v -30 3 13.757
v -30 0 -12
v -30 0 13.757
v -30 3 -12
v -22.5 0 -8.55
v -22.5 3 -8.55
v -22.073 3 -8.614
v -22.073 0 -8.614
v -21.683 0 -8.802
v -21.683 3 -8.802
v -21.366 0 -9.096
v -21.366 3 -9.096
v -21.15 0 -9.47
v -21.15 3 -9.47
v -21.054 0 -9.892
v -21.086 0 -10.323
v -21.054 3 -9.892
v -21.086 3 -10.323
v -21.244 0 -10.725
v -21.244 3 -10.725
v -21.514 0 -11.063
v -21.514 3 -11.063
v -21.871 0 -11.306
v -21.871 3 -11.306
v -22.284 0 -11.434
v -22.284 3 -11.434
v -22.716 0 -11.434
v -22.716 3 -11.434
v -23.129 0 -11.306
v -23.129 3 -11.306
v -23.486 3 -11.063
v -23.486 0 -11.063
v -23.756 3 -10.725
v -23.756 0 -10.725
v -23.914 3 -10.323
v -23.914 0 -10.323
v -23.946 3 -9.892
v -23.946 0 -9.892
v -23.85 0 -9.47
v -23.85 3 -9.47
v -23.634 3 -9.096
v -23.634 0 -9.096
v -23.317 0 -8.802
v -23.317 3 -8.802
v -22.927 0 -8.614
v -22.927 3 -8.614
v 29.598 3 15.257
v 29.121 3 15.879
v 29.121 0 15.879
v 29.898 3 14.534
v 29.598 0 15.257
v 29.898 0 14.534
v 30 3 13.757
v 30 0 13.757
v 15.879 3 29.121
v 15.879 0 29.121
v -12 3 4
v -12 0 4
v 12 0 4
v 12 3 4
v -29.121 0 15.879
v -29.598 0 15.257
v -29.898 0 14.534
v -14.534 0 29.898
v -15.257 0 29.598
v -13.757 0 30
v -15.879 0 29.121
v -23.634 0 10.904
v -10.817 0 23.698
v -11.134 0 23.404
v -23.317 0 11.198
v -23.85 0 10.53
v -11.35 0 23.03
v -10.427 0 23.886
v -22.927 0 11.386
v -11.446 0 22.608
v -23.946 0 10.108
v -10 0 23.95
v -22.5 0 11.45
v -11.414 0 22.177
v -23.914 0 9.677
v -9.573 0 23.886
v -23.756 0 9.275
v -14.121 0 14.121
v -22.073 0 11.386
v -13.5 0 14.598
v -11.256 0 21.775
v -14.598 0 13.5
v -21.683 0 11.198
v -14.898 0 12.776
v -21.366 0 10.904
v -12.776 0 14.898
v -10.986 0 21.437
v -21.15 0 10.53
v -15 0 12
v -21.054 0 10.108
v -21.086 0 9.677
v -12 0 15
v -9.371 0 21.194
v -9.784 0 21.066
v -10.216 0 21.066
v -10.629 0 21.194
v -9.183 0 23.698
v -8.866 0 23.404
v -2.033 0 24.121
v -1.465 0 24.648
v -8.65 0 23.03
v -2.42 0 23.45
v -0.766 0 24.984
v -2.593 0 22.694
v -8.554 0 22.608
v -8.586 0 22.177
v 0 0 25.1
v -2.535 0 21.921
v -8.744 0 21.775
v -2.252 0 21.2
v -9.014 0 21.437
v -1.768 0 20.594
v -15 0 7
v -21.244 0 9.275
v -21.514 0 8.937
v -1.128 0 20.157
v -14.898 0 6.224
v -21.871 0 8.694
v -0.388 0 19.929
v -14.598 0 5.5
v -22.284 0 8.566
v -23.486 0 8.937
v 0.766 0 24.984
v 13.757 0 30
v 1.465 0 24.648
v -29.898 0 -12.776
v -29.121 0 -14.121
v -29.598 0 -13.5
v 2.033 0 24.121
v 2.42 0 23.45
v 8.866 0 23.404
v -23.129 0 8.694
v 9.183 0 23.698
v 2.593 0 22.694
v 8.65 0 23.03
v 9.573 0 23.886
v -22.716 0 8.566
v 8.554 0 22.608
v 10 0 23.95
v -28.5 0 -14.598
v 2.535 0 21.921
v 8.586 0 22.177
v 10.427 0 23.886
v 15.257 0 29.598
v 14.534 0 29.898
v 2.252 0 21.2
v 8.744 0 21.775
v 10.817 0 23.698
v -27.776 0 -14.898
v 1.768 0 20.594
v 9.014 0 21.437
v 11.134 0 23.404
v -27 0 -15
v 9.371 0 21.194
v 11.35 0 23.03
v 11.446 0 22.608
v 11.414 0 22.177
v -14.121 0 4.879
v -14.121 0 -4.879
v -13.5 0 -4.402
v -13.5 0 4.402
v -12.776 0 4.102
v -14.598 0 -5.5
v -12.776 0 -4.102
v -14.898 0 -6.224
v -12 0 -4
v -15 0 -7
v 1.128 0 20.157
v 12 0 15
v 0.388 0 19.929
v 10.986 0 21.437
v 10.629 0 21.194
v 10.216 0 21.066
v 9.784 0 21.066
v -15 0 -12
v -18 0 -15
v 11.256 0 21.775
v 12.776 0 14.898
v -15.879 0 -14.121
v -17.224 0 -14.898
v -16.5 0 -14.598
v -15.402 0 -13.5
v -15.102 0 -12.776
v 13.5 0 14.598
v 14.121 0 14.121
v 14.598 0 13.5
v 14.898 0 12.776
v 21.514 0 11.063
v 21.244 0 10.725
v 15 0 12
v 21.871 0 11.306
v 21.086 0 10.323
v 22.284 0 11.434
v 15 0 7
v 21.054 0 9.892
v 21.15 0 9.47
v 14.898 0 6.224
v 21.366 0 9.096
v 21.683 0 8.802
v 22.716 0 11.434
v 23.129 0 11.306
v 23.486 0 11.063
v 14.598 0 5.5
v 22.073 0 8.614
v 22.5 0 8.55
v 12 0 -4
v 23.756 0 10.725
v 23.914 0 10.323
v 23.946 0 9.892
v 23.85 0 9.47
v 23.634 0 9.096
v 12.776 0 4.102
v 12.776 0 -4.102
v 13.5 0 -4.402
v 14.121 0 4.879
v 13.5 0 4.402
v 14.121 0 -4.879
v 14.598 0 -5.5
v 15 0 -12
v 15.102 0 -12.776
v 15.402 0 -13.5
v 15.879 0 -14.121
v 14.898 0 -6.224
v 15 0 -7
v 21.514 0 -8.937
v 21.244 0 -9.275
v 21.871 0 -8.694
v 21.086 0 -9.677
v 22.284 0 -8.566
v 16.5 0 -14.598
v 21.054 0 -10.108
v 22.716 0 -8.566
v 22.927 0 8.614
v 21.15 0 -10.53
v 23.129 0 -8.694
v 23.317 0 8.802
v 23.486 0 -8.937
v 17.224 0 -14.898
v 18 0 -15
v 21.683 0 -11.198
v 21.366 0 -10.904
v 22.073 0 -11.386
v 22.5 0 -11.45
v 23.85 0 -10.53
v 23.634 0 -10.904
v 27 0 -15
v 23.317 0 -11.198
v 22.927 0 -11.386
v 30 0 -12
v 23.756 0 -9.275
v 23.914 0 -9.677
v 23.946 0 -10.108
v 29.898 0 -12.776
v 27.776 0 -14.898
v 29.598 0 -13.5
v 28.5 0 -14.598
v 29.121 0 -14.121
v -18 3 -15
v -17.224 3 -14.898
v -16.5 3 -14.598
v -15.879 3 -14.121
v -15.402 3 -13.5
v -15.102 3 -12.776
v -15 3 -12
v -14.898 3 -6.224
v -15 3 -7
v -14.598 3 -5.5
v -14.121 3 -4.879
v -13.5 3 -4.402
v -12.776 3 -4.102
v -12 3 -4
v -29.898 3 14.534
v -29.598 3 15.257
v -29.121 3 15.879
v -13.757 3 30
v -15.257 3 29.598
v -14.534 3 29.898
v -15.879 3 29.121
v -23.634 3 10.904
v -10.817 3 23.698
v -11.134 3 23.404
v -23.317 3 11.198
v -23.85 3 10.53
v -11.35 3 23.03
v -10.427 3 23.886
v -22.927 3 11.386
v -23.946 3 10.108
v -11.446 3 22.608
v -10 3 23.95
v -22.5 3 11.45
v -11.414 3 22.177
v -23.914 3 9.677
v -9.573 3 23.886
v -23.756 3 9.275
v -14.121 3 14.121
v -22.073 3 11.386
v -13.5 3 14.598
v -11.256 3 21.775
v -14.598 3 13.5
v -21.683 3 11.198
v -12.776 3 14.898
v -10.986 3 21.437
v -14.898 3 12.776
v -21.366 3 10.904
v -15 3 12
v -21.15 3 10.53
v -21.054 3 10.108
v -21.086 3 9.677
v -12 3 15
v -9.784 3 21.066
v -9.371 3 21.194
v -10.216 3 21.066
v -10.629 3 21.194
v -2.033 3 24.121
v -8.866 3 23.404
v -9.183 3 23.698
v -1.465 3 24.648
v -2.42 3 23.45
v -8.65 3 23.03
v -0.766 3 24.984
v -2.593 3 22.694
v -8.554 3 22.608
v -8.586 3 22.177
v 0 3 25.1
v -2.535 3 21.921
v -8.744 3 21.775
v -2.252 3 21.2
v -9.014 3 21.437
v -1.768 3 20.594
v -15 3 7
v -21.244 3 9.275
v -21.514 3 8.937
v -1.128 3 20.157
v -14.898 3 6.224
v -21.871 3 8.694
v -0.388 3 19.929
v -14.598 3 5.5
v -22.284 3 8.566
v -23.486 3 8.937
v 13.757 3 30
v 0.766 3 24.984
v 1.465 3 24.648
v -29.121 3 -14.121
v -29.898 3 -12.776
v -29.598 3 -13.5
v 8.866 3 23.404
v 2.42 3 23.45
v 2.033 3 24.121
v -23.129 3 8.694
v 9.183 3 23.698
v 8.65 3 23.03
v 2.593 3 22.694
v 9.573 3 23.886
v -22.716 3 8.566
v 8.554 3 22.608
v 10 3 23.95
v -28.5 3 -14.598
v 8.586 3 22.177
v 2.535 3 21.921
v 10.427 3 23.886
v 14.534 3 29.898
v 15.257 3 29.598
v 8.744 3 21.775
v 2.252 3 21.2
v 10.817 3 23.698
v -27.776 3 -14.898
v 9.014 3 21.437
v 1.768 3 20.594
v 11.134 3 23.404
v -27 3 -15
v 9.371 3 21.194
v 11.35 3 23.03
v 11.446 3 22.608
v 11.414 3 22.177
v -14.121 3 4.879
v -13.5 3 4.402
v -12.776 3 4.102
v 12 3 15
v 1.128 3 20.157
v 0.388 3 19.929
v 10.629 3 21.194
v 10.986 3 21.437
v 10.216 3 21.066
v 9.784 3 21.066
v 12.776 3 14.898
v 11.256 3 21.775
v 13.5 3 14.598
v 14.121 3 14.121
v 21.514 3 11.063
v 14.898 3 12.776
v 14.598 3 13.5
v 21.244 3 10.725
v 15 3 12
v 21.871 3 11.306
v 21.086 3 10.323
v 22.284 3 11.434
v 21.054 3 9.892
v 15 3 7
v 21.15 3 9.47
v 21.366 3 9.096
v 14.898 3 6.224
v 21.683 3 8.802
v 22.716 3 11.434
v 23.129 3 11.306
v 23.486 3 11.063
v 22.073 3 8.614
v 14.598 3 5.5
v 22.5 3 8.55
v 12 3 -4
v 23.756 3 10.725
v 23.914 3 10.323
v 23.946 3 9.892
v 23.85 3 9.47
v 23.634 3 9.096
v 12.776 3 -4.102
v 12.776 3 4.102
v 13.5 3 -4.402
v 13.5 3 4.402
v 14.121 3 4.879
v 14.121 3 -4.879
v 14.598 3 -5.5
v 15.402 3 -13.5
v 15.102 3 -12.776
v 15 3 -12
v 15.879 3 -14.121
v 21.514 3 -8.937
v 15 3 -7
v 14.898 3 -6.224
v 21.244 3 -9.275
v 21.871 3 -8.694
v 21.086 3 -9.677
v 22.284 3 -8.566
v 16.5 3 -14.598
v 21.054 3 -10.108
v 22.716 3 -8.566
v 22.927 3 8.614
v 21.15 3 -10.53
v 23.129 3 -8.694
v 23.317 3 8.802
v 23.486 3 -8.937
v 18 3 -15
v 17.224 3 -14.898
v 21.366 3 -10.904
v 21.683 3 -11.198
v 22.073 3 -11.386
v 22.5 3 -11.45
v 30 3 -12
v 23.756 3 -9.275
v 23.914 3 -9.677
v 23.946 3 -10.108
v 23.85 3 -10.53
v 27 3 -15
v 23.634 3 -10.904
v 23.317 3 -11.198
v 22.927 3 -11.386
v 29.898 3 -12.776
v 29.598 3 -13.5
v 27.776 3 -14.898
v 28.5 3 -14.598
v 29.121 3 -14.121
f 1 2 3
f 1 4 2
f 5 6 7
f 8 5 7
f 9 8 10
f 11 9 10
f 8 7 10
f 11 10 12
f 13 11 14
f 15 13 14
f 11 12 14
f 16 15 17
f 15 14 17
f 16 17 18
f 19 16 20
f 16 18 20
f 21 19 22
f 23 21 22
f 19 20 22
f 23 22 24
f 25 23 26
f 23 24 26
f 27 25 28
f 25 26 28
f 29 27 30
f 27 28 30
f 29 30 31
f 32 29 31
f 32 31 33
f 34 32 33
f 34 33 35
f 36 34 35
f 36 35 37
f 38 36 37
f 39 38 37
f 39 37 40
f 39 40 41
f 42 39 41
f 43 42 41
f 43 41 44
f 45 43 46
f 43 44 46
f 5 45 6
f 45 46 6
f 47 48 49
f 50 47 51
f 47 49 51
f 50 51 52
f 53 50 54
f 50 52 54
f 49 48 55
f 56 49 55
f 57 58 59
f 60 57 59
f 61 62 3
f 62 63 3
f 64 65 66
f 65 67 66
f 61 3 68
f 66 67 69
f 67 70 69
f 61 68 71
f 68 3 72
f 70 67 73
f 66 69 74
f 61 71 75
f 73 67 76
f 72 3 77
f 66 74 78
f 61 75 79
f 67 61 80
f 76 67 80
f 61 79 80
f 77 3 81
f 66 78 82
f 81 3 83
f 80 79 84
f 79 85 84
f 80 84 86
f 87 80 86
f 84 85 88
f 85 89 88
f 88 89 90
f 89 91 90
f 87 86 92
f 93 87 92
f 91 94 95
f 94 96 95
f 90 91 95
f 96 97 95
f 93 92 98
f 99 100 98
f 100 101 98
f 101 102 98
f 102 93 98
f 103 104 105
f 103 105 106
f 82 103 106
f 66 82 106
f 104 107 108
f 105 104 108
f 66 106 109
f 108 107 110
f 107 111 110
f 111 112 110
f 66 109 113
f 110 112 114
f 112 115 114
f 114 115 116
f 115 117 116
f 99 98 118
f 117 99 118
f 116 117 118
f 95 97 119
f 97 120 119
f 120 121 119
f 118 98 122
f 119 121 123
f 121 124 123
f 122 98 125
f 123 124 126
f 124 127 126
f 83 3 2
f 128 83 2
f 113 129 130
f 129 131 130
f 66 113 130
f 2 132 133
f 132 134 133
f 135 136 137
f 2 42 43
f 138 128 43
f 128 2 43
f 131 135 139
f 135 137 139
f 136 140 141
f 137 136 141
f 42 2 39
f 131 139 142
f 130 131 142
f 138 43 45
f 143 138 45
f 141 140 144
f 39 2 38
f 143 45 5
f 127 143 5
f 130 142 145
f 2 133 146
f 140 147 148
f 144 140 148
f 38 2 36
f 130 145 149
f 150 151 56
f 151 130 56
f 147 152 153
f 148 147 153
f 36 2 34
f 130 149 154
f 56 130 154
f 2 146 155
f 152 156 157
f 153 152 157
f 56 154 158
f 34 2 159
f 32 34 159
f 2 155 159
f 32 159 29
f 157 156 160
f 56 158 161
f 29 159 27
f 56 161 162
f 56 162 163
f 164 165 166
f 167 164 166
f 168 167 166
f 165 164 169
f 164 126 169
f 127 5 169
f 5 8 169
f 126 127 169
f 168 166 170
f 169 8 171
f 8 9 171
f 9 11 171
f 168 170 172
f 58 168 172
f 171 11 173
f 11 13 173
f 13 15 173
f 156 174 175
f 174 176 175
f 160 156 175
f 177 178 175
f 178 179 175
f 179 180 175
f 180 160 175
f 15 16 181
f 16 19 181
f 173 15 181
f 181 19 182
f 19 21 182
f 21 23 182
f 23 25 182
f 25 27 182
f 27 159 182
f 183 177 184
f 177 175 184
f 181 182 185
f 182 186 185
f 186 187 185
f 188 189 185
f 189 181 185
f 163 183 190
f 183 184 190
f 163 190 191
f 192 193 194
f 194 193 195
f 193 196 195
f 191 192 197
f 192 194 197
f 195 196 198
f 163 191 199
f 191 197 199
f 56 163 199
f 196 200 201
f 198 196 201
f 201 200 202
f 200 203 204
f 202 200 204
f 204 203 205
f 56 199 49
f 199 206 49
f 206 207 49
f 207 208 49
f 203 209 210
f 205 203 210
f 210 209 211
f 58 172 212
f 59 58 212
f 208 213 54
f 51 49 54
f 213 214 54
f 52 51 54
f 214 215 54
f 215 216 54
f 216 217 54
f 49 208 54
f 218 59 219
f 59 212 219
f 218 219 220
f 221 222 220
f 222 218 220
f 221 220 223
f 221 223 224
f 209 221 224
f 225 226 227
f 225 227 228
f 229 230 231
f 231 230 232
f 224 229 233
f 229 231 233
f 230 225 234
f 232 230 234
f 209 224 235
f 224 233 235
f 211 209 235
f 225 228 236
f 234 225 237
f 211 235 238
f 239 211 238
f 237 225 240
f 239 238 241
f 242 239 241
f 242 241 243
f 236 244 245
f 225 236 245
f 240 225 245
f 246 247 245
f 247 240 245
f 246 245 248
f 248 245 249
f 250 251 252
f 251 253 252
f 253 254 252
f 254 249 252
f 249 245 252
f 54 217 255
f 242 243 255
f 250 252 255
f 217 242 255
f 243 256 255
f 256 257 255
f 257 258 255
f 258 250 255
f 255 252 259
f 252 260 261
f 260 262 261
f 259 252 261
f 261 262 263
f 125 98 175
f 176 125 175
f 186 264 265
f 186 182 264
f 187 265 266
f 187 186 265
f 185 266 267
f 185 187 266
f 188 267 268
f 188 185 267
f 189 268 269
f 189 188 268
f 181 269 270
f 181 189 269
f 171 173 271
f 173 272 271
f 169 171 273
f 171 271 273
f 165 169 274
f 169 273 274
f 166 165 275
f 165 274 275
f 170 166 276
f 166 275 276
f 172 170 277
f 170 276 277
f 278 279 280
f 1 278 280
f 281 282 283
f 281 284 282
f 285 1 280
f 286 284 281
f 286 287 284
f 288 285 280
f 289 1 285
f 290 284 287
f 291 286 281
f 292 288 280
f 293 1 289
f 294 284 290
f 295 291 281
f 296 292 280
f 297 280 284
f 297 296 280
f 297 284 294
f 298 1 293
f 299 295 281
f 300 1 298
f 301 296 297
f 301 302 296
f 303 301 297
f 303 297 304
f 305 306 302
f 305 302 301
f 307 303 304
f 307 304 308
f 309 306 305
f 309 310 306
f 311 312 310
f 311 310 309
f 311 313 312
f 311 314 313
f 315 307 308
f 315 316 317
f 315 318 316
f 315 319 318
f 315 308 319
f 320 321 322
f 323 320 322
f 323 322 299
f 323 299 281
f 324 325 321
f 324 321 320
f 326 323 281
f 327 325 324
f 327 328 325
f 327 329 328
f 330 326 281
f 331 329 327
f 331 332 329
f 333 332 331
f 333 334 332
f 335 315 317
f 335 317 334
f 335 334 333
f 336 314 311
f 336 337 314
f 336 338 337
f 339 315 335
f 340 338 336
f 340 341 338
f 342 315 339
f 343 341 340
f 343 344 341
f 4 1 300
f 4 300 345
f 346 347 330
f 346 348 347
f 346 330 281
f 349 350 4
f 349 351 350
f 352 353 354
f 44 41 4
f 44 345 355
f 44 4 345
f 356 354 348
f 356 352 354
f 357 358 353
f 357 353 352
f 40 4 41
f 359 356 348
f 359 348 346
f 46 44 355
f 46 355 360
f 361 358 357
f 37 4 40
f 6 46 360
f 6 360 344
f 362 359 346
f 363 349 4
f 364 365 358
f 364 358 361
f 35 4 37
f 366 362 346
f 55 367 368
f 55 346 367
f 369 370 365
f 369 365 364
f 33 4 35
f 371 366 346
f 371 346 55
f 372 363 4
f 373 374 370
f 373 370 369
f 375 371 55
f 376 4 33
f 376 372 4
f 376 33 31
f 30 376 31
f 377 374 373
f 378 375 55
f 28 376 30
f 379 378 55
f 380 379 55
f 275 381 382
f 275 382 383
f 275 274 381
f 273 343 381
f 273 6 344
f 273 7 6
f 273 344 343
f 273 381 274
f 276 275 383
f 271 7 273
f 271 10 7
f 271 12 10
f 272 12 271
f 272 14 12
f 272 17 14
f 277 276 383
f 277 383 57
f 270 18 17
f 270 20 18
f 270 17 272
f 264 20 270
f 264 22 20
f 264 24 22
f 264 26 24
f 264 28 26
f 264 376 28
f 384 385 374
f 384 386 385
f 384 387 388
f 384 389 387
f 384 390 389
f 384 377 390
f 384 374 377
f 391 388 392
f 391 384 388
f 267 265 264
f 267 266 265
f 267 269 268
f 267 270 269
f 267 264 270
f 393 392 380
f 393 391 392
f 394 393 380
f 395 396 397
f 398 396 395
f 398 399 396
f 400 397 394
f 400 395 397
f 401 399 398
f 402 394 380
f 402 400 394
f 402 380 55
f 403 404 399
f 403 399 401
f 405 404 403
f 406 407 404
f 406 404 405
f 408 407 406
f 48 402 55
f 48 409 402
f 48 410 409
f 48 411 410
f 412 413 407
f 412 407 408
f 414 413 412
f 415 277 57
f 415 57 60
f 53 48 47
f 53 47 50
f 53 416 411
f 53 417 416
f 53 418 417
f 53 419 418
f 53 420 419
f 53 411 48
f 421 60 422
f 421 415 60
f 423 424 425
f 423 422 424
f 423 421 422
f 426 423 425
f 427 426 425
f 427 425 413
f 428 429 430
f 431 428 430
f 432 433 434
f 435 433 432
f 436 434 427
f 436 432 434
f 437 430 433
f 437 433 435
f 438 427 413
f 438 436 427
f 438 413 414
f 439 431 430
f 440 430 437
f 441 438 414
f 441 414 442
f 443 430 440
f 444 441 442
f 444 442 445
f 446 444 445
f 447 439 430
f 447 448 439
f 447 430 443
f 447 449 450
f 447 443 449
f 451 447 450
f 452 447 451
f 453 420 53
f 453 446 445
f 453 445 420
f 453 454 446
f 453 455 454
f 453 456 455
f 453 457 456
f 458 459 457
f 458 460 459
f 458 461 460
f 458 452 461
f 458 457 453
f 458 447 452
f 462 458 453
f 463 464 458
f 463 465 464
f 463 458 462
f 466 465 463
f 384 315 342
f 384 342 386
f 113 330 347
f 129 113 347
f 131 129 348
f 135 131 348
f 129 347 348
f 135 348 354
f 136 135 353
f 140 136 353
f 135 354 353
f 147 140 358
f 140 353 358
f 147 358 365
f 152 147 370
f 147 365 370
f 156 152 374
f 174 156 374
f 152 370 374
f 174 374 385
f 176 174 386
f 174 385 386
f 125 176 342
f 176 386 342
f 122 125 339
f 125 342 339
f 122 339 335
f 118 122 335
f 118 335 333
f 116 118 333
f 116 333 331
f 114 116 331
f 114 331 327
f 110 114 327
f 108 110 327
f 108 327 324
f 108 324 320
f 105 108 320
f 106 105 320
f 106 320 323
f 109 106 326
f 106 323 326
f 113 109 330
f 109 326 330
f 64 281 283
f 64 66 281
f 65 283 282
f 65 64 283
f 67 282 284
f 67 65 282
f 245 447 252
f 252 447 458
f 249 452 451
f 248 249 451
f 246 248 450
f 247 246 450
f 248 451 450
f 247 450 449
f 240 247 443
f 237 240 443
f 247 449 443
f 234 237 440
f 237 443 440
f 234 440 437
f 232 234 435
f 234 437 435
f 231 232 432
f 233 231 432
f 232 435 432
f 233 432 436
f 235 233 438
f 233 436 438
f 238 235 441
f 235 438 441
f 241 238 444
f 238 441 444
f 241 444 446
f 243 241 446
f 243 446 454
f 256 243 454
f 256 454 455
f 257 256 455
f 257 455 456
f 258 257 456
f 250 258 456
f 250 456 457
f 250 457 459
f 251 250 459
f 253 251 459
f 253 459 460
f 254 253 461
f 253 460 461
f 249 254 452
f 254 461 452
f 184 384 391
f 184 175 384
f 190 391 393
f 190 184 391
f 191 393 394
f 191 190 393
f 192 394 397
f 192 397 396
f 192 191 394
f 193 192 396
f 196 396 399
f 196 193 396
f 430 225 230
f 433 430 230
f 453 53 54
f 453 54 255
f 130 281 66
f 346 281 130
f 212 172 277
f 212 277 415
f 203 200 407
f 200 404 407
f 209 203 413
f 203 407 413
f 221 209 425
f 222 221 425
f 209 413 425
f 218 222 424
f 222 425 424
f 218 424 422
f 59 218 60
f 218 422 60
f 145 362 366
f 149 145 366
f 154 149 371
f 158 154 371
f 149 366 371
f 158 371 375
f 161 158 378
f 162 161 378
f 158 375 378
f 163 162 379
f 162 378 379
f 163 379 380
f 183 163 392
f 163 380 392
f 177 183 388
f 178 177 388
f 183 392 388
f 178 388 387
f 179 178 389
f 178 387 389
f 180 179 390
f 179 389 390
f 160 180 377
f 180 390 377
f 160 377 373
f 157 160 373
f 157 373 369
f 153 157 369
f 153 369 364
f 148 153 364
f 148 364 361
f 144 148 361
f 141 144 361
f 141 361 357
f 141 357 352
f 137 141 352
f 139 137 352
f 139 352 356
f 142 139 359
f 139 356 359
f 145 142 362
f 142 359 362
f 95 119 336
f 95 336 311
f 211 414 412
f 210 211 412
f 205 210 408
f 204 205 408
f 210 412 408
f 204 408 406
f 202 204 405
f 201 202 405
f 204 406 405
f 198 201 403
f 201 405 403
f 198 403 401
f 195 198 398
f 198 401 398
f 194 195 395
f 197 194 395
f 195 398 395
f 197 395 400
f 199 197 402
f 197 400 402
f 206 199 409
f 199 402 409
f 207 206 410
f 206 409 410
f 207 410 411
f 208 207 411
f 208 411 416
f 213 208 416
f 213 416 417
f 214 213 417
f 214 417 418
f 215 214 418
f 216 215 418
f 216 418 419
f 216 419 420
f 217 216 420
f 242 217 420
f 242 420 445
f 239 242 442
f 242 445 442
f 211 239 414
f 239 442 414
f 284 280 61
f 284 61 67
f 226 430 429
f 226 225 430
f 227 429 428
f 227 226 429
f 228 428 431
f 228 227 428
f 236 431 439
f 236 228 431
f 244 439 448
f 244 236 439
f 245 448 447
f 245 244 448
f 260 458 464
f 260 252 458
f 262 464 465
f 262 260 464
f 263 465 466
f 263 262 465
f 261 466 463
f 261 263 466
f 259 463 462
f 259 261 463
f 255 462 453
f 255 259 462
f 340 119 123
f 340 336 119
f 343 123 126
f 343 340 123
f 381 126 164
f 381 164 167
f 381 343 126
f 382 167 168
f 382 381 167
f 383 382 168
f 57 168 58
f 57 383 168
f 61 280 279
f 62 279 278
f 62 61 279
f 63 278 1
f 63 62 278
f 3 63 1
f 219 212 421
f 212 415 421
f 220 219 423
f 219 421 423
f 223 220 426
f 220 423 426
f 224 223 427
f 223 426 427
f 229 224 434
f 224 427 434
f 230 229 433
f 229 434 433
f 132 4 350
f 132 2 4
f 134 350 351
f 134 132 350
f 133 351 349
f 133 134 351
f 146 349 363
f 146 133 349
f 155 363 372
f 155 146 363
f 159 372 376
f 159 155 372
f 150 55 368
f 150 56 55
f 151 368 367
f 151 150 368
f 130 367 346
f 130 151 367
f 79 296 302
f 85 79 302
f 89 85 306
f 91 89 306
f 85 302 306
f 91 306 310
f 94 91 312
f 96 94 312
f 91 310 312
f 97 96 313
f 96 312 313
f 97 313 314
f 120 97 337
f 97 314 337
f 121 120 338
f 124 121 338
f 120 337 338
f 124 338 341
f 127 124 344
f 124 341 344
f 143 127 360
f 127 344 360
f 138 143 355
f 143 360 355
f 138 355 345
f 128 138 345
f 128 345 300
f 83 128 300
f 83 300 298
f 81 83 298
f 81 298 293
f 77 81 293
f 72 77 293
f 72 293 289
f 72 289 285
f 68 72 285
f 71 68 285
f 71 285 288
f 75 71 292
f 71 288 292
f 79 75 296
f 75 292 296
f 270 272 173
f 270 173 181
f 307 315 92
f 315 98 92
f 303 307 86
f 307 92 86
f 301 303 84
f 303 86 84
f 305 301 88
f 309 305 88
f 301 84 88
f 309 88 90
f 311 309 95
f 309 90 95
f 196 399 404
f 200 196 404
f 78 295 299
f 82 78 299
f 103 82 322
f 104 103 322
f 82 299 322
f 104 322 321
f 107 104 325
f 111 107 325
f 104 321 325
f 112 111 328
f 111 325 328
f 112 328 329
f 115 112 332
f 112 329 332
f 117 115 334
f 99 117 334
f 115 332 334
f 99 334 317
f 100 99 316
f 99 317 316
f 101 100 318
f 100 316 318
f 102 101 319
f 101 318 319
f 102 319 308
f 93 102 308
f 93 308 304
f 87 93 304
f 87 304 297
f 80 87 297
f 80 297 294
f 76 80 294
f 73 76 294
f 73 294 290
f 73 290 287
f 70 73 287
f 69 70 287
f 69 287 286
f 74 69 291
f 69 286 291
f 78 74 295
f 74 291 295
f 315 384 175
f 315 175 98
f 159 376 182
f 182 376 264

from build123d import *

# Parameters (mm, degrees)
SKETCH_1_W          = 30
SKETCH_1_H          = 20
EXTRUDE_1_DEPTH     = 3
SKETCH_2_R          = 1.6
CUT_EXTRUDE_1_DEPTH = 19.275666882
SKETCH_3_W          = 15
SKETCH_3_H          = 30
SKETCH_3_R          = 1.45
EXTRUDE_2_DEPTH     = 3
SKETCH_4_W          = 30
SKETCH_4_H          = 6
CUT_EXTRUDE_2_DEPTH = 34.674916481
SKETCH_5_R          = 1.45
SKETCH_5_R_2        = 2.6
EXTRUDE_3_DEPTH     = 3
CUT_EXTRUDE_3_DEPTH = 43.532340636
FILLET_1_R          = 3


with BuildPart() as part:
    # 草图1 → 凸台-拉伸1 (new body)
    with BuildSketch(Plane(origin=(0, 0, 0), x_dir=(1, 0, 0), z_dir=(0, 1, 0))):
        Rectangle(SKETCH_1_W, SKETCH_1_H)
    extrude(amount=EXTRUDE_1_DEPTH)

    # 草图2 → 切除-拉伸1 (cut, through all)
    with BuildSketch(Plane(origin=(0, 3, 0), x_dir=(1, 0, 0), z_dir=(0, 1, 0))):
        with Locations(Location((-5, 7.5, 0), (0, 0, 270))):
            Circle(SKETCH_2_R)
        with Locations(Location((5, 7.5, 0), (0, 0, 270))):
            Circle(SKETCH_2_R)
        with Locations(Location((5, -7.5, 0), (0, 0, 270))):
            Circle(SKETCH_2_R)
        with Locations(Location((-5, -7.5, 0), (0, 0, 270))):
            Circle(SKETCH_2_R)
    extrude(amount=-CUT_EXTRUDE_1_DEPTH, mode=Mode.SUBTRACT)

    # 草图3 → 凸台-拉伸2 (add)
    # profile 1 of 2: a face of its own
    with BuildSketch(Plane(origin=(0, 3, 0), x_dir=(1, 0, 0), z_dir=(0, 1, 0))):
        with Locations((22.5, 0)):
            Rectangle(SKETCH_3_W, SKETCH_3_H)
        with Locations(Location((22.5, -10, 0), (0, 0, 90))):
            Circle(SKETCH_3_R, mode=Mode.SUBTRACT)
        with Locations(Location((22.5, 10, 0), (0, 0, 90))):
            Circle(SKETCH_3_R, mode=Mode.SUBTRACT)
    # profile 2 of 2: a face of its own
    with BuildSketch(Plane(origin=(0, 3, 0), x_dir=(1, 0, 0), z_dir=(0, 1, 0))):
        with Locations((-22.5, 0)):
            Rectangle(SKETCH_3_W, SKETCH_3_H)
        with Locations(Location((-22.5, 10, 0), (0, 0, 270))):
            Circle(SKETCH_3_R, mode=Mode.SUBTRACT)
        with Locations(Location((-22.5, -10, 0), (0, 0, 270))):
            Circle(SKETCH_3_R, mode=Mode.SUBTRACT)
    extrude(amount=-EXTRUDE_2_DEPTH)

    # 草图4 → 切除-拉伸2 (cut, through all)
    with BuildSketch(Plane.XZ):
        with Locations((0, 7)):
            Rectangle(SKETCH_4_W, SKETCH_4_H)
        with Locations((0, -7)):
            Rectangle(SKETCH_4_W, SKETCH_4_H)
    extrude(amount=-CUT_EXTRUDE_2_DEPTH, mode=Mode.SUBTRACT)

    # 草图5 → 凸台-拉伸3 (add)
    with BuildSketch(Plane(origin=(0, 3, 0), x_dir=(1, 0, 0), z_dir=(0, 1, 0))):
        Polygon((30, -15), (15, -15), (-15, -15), (-30, -15), (-30, -30), (30, -30), align=None)
        with Locations(Location((-10, -22.5, 0), (0, 0, 270))):
            Circle(SKETCH_5_R, mode=Mode.SUBTRACT)
        with Locations(Location((0, -22.5, 0), (0, 0, 270))):
            Circle(SKETCH_5_R_2, mode=Mode.SUBTRACT)
        with Locations(Location((10, -22.5, 0), (0, 0, 270))):
            Circle(SKETCH_5_R, mode=Mode.SUBTRACT)
    extrude(amount=-EXTRUDE_3_DEPTH)

    # 草图6 → 切除-拉伸3 (cut, through all)
    with BuildSketch(Plane(origin=(0, 3, 0), x_dir=(1, 0, 0), z_dir=(0, 1, 0))):
        Polygon((-30, -15), (-15, -30), (-30, -30), align=None)
        Polygon((30, -30), (30, -15), (15, -30), align=None)
    extrude(amount=-CUT_EXTRUDE_3_DEPTH, mode=Mode.SUBTRACT)

    # 圆角1
    fillet_1_edges = [part.edges().sort_by_distance(p)[0] for p in [
        (-30, 1.5, 15),
        (-15, 1.5, 30),
        (15, 1.5, 30),
        (30, 1.5, 15),
        (15, 1.5, 15),
        (15, 1.5, -15),
        (30, 1.5, -15),
        (-15, 1.5, -15),
        (-15, 1.5, 15),
        (-30, 1.5, -15),
        (-15, 1.5, 4),
        (15, 1.5, 4),
        (-15, 1.5, -4),
        (15, 1.5, -4),
    ]]
    fillet(fillet_1_edges, radius=FILLET_1_R)


solid = part.part
